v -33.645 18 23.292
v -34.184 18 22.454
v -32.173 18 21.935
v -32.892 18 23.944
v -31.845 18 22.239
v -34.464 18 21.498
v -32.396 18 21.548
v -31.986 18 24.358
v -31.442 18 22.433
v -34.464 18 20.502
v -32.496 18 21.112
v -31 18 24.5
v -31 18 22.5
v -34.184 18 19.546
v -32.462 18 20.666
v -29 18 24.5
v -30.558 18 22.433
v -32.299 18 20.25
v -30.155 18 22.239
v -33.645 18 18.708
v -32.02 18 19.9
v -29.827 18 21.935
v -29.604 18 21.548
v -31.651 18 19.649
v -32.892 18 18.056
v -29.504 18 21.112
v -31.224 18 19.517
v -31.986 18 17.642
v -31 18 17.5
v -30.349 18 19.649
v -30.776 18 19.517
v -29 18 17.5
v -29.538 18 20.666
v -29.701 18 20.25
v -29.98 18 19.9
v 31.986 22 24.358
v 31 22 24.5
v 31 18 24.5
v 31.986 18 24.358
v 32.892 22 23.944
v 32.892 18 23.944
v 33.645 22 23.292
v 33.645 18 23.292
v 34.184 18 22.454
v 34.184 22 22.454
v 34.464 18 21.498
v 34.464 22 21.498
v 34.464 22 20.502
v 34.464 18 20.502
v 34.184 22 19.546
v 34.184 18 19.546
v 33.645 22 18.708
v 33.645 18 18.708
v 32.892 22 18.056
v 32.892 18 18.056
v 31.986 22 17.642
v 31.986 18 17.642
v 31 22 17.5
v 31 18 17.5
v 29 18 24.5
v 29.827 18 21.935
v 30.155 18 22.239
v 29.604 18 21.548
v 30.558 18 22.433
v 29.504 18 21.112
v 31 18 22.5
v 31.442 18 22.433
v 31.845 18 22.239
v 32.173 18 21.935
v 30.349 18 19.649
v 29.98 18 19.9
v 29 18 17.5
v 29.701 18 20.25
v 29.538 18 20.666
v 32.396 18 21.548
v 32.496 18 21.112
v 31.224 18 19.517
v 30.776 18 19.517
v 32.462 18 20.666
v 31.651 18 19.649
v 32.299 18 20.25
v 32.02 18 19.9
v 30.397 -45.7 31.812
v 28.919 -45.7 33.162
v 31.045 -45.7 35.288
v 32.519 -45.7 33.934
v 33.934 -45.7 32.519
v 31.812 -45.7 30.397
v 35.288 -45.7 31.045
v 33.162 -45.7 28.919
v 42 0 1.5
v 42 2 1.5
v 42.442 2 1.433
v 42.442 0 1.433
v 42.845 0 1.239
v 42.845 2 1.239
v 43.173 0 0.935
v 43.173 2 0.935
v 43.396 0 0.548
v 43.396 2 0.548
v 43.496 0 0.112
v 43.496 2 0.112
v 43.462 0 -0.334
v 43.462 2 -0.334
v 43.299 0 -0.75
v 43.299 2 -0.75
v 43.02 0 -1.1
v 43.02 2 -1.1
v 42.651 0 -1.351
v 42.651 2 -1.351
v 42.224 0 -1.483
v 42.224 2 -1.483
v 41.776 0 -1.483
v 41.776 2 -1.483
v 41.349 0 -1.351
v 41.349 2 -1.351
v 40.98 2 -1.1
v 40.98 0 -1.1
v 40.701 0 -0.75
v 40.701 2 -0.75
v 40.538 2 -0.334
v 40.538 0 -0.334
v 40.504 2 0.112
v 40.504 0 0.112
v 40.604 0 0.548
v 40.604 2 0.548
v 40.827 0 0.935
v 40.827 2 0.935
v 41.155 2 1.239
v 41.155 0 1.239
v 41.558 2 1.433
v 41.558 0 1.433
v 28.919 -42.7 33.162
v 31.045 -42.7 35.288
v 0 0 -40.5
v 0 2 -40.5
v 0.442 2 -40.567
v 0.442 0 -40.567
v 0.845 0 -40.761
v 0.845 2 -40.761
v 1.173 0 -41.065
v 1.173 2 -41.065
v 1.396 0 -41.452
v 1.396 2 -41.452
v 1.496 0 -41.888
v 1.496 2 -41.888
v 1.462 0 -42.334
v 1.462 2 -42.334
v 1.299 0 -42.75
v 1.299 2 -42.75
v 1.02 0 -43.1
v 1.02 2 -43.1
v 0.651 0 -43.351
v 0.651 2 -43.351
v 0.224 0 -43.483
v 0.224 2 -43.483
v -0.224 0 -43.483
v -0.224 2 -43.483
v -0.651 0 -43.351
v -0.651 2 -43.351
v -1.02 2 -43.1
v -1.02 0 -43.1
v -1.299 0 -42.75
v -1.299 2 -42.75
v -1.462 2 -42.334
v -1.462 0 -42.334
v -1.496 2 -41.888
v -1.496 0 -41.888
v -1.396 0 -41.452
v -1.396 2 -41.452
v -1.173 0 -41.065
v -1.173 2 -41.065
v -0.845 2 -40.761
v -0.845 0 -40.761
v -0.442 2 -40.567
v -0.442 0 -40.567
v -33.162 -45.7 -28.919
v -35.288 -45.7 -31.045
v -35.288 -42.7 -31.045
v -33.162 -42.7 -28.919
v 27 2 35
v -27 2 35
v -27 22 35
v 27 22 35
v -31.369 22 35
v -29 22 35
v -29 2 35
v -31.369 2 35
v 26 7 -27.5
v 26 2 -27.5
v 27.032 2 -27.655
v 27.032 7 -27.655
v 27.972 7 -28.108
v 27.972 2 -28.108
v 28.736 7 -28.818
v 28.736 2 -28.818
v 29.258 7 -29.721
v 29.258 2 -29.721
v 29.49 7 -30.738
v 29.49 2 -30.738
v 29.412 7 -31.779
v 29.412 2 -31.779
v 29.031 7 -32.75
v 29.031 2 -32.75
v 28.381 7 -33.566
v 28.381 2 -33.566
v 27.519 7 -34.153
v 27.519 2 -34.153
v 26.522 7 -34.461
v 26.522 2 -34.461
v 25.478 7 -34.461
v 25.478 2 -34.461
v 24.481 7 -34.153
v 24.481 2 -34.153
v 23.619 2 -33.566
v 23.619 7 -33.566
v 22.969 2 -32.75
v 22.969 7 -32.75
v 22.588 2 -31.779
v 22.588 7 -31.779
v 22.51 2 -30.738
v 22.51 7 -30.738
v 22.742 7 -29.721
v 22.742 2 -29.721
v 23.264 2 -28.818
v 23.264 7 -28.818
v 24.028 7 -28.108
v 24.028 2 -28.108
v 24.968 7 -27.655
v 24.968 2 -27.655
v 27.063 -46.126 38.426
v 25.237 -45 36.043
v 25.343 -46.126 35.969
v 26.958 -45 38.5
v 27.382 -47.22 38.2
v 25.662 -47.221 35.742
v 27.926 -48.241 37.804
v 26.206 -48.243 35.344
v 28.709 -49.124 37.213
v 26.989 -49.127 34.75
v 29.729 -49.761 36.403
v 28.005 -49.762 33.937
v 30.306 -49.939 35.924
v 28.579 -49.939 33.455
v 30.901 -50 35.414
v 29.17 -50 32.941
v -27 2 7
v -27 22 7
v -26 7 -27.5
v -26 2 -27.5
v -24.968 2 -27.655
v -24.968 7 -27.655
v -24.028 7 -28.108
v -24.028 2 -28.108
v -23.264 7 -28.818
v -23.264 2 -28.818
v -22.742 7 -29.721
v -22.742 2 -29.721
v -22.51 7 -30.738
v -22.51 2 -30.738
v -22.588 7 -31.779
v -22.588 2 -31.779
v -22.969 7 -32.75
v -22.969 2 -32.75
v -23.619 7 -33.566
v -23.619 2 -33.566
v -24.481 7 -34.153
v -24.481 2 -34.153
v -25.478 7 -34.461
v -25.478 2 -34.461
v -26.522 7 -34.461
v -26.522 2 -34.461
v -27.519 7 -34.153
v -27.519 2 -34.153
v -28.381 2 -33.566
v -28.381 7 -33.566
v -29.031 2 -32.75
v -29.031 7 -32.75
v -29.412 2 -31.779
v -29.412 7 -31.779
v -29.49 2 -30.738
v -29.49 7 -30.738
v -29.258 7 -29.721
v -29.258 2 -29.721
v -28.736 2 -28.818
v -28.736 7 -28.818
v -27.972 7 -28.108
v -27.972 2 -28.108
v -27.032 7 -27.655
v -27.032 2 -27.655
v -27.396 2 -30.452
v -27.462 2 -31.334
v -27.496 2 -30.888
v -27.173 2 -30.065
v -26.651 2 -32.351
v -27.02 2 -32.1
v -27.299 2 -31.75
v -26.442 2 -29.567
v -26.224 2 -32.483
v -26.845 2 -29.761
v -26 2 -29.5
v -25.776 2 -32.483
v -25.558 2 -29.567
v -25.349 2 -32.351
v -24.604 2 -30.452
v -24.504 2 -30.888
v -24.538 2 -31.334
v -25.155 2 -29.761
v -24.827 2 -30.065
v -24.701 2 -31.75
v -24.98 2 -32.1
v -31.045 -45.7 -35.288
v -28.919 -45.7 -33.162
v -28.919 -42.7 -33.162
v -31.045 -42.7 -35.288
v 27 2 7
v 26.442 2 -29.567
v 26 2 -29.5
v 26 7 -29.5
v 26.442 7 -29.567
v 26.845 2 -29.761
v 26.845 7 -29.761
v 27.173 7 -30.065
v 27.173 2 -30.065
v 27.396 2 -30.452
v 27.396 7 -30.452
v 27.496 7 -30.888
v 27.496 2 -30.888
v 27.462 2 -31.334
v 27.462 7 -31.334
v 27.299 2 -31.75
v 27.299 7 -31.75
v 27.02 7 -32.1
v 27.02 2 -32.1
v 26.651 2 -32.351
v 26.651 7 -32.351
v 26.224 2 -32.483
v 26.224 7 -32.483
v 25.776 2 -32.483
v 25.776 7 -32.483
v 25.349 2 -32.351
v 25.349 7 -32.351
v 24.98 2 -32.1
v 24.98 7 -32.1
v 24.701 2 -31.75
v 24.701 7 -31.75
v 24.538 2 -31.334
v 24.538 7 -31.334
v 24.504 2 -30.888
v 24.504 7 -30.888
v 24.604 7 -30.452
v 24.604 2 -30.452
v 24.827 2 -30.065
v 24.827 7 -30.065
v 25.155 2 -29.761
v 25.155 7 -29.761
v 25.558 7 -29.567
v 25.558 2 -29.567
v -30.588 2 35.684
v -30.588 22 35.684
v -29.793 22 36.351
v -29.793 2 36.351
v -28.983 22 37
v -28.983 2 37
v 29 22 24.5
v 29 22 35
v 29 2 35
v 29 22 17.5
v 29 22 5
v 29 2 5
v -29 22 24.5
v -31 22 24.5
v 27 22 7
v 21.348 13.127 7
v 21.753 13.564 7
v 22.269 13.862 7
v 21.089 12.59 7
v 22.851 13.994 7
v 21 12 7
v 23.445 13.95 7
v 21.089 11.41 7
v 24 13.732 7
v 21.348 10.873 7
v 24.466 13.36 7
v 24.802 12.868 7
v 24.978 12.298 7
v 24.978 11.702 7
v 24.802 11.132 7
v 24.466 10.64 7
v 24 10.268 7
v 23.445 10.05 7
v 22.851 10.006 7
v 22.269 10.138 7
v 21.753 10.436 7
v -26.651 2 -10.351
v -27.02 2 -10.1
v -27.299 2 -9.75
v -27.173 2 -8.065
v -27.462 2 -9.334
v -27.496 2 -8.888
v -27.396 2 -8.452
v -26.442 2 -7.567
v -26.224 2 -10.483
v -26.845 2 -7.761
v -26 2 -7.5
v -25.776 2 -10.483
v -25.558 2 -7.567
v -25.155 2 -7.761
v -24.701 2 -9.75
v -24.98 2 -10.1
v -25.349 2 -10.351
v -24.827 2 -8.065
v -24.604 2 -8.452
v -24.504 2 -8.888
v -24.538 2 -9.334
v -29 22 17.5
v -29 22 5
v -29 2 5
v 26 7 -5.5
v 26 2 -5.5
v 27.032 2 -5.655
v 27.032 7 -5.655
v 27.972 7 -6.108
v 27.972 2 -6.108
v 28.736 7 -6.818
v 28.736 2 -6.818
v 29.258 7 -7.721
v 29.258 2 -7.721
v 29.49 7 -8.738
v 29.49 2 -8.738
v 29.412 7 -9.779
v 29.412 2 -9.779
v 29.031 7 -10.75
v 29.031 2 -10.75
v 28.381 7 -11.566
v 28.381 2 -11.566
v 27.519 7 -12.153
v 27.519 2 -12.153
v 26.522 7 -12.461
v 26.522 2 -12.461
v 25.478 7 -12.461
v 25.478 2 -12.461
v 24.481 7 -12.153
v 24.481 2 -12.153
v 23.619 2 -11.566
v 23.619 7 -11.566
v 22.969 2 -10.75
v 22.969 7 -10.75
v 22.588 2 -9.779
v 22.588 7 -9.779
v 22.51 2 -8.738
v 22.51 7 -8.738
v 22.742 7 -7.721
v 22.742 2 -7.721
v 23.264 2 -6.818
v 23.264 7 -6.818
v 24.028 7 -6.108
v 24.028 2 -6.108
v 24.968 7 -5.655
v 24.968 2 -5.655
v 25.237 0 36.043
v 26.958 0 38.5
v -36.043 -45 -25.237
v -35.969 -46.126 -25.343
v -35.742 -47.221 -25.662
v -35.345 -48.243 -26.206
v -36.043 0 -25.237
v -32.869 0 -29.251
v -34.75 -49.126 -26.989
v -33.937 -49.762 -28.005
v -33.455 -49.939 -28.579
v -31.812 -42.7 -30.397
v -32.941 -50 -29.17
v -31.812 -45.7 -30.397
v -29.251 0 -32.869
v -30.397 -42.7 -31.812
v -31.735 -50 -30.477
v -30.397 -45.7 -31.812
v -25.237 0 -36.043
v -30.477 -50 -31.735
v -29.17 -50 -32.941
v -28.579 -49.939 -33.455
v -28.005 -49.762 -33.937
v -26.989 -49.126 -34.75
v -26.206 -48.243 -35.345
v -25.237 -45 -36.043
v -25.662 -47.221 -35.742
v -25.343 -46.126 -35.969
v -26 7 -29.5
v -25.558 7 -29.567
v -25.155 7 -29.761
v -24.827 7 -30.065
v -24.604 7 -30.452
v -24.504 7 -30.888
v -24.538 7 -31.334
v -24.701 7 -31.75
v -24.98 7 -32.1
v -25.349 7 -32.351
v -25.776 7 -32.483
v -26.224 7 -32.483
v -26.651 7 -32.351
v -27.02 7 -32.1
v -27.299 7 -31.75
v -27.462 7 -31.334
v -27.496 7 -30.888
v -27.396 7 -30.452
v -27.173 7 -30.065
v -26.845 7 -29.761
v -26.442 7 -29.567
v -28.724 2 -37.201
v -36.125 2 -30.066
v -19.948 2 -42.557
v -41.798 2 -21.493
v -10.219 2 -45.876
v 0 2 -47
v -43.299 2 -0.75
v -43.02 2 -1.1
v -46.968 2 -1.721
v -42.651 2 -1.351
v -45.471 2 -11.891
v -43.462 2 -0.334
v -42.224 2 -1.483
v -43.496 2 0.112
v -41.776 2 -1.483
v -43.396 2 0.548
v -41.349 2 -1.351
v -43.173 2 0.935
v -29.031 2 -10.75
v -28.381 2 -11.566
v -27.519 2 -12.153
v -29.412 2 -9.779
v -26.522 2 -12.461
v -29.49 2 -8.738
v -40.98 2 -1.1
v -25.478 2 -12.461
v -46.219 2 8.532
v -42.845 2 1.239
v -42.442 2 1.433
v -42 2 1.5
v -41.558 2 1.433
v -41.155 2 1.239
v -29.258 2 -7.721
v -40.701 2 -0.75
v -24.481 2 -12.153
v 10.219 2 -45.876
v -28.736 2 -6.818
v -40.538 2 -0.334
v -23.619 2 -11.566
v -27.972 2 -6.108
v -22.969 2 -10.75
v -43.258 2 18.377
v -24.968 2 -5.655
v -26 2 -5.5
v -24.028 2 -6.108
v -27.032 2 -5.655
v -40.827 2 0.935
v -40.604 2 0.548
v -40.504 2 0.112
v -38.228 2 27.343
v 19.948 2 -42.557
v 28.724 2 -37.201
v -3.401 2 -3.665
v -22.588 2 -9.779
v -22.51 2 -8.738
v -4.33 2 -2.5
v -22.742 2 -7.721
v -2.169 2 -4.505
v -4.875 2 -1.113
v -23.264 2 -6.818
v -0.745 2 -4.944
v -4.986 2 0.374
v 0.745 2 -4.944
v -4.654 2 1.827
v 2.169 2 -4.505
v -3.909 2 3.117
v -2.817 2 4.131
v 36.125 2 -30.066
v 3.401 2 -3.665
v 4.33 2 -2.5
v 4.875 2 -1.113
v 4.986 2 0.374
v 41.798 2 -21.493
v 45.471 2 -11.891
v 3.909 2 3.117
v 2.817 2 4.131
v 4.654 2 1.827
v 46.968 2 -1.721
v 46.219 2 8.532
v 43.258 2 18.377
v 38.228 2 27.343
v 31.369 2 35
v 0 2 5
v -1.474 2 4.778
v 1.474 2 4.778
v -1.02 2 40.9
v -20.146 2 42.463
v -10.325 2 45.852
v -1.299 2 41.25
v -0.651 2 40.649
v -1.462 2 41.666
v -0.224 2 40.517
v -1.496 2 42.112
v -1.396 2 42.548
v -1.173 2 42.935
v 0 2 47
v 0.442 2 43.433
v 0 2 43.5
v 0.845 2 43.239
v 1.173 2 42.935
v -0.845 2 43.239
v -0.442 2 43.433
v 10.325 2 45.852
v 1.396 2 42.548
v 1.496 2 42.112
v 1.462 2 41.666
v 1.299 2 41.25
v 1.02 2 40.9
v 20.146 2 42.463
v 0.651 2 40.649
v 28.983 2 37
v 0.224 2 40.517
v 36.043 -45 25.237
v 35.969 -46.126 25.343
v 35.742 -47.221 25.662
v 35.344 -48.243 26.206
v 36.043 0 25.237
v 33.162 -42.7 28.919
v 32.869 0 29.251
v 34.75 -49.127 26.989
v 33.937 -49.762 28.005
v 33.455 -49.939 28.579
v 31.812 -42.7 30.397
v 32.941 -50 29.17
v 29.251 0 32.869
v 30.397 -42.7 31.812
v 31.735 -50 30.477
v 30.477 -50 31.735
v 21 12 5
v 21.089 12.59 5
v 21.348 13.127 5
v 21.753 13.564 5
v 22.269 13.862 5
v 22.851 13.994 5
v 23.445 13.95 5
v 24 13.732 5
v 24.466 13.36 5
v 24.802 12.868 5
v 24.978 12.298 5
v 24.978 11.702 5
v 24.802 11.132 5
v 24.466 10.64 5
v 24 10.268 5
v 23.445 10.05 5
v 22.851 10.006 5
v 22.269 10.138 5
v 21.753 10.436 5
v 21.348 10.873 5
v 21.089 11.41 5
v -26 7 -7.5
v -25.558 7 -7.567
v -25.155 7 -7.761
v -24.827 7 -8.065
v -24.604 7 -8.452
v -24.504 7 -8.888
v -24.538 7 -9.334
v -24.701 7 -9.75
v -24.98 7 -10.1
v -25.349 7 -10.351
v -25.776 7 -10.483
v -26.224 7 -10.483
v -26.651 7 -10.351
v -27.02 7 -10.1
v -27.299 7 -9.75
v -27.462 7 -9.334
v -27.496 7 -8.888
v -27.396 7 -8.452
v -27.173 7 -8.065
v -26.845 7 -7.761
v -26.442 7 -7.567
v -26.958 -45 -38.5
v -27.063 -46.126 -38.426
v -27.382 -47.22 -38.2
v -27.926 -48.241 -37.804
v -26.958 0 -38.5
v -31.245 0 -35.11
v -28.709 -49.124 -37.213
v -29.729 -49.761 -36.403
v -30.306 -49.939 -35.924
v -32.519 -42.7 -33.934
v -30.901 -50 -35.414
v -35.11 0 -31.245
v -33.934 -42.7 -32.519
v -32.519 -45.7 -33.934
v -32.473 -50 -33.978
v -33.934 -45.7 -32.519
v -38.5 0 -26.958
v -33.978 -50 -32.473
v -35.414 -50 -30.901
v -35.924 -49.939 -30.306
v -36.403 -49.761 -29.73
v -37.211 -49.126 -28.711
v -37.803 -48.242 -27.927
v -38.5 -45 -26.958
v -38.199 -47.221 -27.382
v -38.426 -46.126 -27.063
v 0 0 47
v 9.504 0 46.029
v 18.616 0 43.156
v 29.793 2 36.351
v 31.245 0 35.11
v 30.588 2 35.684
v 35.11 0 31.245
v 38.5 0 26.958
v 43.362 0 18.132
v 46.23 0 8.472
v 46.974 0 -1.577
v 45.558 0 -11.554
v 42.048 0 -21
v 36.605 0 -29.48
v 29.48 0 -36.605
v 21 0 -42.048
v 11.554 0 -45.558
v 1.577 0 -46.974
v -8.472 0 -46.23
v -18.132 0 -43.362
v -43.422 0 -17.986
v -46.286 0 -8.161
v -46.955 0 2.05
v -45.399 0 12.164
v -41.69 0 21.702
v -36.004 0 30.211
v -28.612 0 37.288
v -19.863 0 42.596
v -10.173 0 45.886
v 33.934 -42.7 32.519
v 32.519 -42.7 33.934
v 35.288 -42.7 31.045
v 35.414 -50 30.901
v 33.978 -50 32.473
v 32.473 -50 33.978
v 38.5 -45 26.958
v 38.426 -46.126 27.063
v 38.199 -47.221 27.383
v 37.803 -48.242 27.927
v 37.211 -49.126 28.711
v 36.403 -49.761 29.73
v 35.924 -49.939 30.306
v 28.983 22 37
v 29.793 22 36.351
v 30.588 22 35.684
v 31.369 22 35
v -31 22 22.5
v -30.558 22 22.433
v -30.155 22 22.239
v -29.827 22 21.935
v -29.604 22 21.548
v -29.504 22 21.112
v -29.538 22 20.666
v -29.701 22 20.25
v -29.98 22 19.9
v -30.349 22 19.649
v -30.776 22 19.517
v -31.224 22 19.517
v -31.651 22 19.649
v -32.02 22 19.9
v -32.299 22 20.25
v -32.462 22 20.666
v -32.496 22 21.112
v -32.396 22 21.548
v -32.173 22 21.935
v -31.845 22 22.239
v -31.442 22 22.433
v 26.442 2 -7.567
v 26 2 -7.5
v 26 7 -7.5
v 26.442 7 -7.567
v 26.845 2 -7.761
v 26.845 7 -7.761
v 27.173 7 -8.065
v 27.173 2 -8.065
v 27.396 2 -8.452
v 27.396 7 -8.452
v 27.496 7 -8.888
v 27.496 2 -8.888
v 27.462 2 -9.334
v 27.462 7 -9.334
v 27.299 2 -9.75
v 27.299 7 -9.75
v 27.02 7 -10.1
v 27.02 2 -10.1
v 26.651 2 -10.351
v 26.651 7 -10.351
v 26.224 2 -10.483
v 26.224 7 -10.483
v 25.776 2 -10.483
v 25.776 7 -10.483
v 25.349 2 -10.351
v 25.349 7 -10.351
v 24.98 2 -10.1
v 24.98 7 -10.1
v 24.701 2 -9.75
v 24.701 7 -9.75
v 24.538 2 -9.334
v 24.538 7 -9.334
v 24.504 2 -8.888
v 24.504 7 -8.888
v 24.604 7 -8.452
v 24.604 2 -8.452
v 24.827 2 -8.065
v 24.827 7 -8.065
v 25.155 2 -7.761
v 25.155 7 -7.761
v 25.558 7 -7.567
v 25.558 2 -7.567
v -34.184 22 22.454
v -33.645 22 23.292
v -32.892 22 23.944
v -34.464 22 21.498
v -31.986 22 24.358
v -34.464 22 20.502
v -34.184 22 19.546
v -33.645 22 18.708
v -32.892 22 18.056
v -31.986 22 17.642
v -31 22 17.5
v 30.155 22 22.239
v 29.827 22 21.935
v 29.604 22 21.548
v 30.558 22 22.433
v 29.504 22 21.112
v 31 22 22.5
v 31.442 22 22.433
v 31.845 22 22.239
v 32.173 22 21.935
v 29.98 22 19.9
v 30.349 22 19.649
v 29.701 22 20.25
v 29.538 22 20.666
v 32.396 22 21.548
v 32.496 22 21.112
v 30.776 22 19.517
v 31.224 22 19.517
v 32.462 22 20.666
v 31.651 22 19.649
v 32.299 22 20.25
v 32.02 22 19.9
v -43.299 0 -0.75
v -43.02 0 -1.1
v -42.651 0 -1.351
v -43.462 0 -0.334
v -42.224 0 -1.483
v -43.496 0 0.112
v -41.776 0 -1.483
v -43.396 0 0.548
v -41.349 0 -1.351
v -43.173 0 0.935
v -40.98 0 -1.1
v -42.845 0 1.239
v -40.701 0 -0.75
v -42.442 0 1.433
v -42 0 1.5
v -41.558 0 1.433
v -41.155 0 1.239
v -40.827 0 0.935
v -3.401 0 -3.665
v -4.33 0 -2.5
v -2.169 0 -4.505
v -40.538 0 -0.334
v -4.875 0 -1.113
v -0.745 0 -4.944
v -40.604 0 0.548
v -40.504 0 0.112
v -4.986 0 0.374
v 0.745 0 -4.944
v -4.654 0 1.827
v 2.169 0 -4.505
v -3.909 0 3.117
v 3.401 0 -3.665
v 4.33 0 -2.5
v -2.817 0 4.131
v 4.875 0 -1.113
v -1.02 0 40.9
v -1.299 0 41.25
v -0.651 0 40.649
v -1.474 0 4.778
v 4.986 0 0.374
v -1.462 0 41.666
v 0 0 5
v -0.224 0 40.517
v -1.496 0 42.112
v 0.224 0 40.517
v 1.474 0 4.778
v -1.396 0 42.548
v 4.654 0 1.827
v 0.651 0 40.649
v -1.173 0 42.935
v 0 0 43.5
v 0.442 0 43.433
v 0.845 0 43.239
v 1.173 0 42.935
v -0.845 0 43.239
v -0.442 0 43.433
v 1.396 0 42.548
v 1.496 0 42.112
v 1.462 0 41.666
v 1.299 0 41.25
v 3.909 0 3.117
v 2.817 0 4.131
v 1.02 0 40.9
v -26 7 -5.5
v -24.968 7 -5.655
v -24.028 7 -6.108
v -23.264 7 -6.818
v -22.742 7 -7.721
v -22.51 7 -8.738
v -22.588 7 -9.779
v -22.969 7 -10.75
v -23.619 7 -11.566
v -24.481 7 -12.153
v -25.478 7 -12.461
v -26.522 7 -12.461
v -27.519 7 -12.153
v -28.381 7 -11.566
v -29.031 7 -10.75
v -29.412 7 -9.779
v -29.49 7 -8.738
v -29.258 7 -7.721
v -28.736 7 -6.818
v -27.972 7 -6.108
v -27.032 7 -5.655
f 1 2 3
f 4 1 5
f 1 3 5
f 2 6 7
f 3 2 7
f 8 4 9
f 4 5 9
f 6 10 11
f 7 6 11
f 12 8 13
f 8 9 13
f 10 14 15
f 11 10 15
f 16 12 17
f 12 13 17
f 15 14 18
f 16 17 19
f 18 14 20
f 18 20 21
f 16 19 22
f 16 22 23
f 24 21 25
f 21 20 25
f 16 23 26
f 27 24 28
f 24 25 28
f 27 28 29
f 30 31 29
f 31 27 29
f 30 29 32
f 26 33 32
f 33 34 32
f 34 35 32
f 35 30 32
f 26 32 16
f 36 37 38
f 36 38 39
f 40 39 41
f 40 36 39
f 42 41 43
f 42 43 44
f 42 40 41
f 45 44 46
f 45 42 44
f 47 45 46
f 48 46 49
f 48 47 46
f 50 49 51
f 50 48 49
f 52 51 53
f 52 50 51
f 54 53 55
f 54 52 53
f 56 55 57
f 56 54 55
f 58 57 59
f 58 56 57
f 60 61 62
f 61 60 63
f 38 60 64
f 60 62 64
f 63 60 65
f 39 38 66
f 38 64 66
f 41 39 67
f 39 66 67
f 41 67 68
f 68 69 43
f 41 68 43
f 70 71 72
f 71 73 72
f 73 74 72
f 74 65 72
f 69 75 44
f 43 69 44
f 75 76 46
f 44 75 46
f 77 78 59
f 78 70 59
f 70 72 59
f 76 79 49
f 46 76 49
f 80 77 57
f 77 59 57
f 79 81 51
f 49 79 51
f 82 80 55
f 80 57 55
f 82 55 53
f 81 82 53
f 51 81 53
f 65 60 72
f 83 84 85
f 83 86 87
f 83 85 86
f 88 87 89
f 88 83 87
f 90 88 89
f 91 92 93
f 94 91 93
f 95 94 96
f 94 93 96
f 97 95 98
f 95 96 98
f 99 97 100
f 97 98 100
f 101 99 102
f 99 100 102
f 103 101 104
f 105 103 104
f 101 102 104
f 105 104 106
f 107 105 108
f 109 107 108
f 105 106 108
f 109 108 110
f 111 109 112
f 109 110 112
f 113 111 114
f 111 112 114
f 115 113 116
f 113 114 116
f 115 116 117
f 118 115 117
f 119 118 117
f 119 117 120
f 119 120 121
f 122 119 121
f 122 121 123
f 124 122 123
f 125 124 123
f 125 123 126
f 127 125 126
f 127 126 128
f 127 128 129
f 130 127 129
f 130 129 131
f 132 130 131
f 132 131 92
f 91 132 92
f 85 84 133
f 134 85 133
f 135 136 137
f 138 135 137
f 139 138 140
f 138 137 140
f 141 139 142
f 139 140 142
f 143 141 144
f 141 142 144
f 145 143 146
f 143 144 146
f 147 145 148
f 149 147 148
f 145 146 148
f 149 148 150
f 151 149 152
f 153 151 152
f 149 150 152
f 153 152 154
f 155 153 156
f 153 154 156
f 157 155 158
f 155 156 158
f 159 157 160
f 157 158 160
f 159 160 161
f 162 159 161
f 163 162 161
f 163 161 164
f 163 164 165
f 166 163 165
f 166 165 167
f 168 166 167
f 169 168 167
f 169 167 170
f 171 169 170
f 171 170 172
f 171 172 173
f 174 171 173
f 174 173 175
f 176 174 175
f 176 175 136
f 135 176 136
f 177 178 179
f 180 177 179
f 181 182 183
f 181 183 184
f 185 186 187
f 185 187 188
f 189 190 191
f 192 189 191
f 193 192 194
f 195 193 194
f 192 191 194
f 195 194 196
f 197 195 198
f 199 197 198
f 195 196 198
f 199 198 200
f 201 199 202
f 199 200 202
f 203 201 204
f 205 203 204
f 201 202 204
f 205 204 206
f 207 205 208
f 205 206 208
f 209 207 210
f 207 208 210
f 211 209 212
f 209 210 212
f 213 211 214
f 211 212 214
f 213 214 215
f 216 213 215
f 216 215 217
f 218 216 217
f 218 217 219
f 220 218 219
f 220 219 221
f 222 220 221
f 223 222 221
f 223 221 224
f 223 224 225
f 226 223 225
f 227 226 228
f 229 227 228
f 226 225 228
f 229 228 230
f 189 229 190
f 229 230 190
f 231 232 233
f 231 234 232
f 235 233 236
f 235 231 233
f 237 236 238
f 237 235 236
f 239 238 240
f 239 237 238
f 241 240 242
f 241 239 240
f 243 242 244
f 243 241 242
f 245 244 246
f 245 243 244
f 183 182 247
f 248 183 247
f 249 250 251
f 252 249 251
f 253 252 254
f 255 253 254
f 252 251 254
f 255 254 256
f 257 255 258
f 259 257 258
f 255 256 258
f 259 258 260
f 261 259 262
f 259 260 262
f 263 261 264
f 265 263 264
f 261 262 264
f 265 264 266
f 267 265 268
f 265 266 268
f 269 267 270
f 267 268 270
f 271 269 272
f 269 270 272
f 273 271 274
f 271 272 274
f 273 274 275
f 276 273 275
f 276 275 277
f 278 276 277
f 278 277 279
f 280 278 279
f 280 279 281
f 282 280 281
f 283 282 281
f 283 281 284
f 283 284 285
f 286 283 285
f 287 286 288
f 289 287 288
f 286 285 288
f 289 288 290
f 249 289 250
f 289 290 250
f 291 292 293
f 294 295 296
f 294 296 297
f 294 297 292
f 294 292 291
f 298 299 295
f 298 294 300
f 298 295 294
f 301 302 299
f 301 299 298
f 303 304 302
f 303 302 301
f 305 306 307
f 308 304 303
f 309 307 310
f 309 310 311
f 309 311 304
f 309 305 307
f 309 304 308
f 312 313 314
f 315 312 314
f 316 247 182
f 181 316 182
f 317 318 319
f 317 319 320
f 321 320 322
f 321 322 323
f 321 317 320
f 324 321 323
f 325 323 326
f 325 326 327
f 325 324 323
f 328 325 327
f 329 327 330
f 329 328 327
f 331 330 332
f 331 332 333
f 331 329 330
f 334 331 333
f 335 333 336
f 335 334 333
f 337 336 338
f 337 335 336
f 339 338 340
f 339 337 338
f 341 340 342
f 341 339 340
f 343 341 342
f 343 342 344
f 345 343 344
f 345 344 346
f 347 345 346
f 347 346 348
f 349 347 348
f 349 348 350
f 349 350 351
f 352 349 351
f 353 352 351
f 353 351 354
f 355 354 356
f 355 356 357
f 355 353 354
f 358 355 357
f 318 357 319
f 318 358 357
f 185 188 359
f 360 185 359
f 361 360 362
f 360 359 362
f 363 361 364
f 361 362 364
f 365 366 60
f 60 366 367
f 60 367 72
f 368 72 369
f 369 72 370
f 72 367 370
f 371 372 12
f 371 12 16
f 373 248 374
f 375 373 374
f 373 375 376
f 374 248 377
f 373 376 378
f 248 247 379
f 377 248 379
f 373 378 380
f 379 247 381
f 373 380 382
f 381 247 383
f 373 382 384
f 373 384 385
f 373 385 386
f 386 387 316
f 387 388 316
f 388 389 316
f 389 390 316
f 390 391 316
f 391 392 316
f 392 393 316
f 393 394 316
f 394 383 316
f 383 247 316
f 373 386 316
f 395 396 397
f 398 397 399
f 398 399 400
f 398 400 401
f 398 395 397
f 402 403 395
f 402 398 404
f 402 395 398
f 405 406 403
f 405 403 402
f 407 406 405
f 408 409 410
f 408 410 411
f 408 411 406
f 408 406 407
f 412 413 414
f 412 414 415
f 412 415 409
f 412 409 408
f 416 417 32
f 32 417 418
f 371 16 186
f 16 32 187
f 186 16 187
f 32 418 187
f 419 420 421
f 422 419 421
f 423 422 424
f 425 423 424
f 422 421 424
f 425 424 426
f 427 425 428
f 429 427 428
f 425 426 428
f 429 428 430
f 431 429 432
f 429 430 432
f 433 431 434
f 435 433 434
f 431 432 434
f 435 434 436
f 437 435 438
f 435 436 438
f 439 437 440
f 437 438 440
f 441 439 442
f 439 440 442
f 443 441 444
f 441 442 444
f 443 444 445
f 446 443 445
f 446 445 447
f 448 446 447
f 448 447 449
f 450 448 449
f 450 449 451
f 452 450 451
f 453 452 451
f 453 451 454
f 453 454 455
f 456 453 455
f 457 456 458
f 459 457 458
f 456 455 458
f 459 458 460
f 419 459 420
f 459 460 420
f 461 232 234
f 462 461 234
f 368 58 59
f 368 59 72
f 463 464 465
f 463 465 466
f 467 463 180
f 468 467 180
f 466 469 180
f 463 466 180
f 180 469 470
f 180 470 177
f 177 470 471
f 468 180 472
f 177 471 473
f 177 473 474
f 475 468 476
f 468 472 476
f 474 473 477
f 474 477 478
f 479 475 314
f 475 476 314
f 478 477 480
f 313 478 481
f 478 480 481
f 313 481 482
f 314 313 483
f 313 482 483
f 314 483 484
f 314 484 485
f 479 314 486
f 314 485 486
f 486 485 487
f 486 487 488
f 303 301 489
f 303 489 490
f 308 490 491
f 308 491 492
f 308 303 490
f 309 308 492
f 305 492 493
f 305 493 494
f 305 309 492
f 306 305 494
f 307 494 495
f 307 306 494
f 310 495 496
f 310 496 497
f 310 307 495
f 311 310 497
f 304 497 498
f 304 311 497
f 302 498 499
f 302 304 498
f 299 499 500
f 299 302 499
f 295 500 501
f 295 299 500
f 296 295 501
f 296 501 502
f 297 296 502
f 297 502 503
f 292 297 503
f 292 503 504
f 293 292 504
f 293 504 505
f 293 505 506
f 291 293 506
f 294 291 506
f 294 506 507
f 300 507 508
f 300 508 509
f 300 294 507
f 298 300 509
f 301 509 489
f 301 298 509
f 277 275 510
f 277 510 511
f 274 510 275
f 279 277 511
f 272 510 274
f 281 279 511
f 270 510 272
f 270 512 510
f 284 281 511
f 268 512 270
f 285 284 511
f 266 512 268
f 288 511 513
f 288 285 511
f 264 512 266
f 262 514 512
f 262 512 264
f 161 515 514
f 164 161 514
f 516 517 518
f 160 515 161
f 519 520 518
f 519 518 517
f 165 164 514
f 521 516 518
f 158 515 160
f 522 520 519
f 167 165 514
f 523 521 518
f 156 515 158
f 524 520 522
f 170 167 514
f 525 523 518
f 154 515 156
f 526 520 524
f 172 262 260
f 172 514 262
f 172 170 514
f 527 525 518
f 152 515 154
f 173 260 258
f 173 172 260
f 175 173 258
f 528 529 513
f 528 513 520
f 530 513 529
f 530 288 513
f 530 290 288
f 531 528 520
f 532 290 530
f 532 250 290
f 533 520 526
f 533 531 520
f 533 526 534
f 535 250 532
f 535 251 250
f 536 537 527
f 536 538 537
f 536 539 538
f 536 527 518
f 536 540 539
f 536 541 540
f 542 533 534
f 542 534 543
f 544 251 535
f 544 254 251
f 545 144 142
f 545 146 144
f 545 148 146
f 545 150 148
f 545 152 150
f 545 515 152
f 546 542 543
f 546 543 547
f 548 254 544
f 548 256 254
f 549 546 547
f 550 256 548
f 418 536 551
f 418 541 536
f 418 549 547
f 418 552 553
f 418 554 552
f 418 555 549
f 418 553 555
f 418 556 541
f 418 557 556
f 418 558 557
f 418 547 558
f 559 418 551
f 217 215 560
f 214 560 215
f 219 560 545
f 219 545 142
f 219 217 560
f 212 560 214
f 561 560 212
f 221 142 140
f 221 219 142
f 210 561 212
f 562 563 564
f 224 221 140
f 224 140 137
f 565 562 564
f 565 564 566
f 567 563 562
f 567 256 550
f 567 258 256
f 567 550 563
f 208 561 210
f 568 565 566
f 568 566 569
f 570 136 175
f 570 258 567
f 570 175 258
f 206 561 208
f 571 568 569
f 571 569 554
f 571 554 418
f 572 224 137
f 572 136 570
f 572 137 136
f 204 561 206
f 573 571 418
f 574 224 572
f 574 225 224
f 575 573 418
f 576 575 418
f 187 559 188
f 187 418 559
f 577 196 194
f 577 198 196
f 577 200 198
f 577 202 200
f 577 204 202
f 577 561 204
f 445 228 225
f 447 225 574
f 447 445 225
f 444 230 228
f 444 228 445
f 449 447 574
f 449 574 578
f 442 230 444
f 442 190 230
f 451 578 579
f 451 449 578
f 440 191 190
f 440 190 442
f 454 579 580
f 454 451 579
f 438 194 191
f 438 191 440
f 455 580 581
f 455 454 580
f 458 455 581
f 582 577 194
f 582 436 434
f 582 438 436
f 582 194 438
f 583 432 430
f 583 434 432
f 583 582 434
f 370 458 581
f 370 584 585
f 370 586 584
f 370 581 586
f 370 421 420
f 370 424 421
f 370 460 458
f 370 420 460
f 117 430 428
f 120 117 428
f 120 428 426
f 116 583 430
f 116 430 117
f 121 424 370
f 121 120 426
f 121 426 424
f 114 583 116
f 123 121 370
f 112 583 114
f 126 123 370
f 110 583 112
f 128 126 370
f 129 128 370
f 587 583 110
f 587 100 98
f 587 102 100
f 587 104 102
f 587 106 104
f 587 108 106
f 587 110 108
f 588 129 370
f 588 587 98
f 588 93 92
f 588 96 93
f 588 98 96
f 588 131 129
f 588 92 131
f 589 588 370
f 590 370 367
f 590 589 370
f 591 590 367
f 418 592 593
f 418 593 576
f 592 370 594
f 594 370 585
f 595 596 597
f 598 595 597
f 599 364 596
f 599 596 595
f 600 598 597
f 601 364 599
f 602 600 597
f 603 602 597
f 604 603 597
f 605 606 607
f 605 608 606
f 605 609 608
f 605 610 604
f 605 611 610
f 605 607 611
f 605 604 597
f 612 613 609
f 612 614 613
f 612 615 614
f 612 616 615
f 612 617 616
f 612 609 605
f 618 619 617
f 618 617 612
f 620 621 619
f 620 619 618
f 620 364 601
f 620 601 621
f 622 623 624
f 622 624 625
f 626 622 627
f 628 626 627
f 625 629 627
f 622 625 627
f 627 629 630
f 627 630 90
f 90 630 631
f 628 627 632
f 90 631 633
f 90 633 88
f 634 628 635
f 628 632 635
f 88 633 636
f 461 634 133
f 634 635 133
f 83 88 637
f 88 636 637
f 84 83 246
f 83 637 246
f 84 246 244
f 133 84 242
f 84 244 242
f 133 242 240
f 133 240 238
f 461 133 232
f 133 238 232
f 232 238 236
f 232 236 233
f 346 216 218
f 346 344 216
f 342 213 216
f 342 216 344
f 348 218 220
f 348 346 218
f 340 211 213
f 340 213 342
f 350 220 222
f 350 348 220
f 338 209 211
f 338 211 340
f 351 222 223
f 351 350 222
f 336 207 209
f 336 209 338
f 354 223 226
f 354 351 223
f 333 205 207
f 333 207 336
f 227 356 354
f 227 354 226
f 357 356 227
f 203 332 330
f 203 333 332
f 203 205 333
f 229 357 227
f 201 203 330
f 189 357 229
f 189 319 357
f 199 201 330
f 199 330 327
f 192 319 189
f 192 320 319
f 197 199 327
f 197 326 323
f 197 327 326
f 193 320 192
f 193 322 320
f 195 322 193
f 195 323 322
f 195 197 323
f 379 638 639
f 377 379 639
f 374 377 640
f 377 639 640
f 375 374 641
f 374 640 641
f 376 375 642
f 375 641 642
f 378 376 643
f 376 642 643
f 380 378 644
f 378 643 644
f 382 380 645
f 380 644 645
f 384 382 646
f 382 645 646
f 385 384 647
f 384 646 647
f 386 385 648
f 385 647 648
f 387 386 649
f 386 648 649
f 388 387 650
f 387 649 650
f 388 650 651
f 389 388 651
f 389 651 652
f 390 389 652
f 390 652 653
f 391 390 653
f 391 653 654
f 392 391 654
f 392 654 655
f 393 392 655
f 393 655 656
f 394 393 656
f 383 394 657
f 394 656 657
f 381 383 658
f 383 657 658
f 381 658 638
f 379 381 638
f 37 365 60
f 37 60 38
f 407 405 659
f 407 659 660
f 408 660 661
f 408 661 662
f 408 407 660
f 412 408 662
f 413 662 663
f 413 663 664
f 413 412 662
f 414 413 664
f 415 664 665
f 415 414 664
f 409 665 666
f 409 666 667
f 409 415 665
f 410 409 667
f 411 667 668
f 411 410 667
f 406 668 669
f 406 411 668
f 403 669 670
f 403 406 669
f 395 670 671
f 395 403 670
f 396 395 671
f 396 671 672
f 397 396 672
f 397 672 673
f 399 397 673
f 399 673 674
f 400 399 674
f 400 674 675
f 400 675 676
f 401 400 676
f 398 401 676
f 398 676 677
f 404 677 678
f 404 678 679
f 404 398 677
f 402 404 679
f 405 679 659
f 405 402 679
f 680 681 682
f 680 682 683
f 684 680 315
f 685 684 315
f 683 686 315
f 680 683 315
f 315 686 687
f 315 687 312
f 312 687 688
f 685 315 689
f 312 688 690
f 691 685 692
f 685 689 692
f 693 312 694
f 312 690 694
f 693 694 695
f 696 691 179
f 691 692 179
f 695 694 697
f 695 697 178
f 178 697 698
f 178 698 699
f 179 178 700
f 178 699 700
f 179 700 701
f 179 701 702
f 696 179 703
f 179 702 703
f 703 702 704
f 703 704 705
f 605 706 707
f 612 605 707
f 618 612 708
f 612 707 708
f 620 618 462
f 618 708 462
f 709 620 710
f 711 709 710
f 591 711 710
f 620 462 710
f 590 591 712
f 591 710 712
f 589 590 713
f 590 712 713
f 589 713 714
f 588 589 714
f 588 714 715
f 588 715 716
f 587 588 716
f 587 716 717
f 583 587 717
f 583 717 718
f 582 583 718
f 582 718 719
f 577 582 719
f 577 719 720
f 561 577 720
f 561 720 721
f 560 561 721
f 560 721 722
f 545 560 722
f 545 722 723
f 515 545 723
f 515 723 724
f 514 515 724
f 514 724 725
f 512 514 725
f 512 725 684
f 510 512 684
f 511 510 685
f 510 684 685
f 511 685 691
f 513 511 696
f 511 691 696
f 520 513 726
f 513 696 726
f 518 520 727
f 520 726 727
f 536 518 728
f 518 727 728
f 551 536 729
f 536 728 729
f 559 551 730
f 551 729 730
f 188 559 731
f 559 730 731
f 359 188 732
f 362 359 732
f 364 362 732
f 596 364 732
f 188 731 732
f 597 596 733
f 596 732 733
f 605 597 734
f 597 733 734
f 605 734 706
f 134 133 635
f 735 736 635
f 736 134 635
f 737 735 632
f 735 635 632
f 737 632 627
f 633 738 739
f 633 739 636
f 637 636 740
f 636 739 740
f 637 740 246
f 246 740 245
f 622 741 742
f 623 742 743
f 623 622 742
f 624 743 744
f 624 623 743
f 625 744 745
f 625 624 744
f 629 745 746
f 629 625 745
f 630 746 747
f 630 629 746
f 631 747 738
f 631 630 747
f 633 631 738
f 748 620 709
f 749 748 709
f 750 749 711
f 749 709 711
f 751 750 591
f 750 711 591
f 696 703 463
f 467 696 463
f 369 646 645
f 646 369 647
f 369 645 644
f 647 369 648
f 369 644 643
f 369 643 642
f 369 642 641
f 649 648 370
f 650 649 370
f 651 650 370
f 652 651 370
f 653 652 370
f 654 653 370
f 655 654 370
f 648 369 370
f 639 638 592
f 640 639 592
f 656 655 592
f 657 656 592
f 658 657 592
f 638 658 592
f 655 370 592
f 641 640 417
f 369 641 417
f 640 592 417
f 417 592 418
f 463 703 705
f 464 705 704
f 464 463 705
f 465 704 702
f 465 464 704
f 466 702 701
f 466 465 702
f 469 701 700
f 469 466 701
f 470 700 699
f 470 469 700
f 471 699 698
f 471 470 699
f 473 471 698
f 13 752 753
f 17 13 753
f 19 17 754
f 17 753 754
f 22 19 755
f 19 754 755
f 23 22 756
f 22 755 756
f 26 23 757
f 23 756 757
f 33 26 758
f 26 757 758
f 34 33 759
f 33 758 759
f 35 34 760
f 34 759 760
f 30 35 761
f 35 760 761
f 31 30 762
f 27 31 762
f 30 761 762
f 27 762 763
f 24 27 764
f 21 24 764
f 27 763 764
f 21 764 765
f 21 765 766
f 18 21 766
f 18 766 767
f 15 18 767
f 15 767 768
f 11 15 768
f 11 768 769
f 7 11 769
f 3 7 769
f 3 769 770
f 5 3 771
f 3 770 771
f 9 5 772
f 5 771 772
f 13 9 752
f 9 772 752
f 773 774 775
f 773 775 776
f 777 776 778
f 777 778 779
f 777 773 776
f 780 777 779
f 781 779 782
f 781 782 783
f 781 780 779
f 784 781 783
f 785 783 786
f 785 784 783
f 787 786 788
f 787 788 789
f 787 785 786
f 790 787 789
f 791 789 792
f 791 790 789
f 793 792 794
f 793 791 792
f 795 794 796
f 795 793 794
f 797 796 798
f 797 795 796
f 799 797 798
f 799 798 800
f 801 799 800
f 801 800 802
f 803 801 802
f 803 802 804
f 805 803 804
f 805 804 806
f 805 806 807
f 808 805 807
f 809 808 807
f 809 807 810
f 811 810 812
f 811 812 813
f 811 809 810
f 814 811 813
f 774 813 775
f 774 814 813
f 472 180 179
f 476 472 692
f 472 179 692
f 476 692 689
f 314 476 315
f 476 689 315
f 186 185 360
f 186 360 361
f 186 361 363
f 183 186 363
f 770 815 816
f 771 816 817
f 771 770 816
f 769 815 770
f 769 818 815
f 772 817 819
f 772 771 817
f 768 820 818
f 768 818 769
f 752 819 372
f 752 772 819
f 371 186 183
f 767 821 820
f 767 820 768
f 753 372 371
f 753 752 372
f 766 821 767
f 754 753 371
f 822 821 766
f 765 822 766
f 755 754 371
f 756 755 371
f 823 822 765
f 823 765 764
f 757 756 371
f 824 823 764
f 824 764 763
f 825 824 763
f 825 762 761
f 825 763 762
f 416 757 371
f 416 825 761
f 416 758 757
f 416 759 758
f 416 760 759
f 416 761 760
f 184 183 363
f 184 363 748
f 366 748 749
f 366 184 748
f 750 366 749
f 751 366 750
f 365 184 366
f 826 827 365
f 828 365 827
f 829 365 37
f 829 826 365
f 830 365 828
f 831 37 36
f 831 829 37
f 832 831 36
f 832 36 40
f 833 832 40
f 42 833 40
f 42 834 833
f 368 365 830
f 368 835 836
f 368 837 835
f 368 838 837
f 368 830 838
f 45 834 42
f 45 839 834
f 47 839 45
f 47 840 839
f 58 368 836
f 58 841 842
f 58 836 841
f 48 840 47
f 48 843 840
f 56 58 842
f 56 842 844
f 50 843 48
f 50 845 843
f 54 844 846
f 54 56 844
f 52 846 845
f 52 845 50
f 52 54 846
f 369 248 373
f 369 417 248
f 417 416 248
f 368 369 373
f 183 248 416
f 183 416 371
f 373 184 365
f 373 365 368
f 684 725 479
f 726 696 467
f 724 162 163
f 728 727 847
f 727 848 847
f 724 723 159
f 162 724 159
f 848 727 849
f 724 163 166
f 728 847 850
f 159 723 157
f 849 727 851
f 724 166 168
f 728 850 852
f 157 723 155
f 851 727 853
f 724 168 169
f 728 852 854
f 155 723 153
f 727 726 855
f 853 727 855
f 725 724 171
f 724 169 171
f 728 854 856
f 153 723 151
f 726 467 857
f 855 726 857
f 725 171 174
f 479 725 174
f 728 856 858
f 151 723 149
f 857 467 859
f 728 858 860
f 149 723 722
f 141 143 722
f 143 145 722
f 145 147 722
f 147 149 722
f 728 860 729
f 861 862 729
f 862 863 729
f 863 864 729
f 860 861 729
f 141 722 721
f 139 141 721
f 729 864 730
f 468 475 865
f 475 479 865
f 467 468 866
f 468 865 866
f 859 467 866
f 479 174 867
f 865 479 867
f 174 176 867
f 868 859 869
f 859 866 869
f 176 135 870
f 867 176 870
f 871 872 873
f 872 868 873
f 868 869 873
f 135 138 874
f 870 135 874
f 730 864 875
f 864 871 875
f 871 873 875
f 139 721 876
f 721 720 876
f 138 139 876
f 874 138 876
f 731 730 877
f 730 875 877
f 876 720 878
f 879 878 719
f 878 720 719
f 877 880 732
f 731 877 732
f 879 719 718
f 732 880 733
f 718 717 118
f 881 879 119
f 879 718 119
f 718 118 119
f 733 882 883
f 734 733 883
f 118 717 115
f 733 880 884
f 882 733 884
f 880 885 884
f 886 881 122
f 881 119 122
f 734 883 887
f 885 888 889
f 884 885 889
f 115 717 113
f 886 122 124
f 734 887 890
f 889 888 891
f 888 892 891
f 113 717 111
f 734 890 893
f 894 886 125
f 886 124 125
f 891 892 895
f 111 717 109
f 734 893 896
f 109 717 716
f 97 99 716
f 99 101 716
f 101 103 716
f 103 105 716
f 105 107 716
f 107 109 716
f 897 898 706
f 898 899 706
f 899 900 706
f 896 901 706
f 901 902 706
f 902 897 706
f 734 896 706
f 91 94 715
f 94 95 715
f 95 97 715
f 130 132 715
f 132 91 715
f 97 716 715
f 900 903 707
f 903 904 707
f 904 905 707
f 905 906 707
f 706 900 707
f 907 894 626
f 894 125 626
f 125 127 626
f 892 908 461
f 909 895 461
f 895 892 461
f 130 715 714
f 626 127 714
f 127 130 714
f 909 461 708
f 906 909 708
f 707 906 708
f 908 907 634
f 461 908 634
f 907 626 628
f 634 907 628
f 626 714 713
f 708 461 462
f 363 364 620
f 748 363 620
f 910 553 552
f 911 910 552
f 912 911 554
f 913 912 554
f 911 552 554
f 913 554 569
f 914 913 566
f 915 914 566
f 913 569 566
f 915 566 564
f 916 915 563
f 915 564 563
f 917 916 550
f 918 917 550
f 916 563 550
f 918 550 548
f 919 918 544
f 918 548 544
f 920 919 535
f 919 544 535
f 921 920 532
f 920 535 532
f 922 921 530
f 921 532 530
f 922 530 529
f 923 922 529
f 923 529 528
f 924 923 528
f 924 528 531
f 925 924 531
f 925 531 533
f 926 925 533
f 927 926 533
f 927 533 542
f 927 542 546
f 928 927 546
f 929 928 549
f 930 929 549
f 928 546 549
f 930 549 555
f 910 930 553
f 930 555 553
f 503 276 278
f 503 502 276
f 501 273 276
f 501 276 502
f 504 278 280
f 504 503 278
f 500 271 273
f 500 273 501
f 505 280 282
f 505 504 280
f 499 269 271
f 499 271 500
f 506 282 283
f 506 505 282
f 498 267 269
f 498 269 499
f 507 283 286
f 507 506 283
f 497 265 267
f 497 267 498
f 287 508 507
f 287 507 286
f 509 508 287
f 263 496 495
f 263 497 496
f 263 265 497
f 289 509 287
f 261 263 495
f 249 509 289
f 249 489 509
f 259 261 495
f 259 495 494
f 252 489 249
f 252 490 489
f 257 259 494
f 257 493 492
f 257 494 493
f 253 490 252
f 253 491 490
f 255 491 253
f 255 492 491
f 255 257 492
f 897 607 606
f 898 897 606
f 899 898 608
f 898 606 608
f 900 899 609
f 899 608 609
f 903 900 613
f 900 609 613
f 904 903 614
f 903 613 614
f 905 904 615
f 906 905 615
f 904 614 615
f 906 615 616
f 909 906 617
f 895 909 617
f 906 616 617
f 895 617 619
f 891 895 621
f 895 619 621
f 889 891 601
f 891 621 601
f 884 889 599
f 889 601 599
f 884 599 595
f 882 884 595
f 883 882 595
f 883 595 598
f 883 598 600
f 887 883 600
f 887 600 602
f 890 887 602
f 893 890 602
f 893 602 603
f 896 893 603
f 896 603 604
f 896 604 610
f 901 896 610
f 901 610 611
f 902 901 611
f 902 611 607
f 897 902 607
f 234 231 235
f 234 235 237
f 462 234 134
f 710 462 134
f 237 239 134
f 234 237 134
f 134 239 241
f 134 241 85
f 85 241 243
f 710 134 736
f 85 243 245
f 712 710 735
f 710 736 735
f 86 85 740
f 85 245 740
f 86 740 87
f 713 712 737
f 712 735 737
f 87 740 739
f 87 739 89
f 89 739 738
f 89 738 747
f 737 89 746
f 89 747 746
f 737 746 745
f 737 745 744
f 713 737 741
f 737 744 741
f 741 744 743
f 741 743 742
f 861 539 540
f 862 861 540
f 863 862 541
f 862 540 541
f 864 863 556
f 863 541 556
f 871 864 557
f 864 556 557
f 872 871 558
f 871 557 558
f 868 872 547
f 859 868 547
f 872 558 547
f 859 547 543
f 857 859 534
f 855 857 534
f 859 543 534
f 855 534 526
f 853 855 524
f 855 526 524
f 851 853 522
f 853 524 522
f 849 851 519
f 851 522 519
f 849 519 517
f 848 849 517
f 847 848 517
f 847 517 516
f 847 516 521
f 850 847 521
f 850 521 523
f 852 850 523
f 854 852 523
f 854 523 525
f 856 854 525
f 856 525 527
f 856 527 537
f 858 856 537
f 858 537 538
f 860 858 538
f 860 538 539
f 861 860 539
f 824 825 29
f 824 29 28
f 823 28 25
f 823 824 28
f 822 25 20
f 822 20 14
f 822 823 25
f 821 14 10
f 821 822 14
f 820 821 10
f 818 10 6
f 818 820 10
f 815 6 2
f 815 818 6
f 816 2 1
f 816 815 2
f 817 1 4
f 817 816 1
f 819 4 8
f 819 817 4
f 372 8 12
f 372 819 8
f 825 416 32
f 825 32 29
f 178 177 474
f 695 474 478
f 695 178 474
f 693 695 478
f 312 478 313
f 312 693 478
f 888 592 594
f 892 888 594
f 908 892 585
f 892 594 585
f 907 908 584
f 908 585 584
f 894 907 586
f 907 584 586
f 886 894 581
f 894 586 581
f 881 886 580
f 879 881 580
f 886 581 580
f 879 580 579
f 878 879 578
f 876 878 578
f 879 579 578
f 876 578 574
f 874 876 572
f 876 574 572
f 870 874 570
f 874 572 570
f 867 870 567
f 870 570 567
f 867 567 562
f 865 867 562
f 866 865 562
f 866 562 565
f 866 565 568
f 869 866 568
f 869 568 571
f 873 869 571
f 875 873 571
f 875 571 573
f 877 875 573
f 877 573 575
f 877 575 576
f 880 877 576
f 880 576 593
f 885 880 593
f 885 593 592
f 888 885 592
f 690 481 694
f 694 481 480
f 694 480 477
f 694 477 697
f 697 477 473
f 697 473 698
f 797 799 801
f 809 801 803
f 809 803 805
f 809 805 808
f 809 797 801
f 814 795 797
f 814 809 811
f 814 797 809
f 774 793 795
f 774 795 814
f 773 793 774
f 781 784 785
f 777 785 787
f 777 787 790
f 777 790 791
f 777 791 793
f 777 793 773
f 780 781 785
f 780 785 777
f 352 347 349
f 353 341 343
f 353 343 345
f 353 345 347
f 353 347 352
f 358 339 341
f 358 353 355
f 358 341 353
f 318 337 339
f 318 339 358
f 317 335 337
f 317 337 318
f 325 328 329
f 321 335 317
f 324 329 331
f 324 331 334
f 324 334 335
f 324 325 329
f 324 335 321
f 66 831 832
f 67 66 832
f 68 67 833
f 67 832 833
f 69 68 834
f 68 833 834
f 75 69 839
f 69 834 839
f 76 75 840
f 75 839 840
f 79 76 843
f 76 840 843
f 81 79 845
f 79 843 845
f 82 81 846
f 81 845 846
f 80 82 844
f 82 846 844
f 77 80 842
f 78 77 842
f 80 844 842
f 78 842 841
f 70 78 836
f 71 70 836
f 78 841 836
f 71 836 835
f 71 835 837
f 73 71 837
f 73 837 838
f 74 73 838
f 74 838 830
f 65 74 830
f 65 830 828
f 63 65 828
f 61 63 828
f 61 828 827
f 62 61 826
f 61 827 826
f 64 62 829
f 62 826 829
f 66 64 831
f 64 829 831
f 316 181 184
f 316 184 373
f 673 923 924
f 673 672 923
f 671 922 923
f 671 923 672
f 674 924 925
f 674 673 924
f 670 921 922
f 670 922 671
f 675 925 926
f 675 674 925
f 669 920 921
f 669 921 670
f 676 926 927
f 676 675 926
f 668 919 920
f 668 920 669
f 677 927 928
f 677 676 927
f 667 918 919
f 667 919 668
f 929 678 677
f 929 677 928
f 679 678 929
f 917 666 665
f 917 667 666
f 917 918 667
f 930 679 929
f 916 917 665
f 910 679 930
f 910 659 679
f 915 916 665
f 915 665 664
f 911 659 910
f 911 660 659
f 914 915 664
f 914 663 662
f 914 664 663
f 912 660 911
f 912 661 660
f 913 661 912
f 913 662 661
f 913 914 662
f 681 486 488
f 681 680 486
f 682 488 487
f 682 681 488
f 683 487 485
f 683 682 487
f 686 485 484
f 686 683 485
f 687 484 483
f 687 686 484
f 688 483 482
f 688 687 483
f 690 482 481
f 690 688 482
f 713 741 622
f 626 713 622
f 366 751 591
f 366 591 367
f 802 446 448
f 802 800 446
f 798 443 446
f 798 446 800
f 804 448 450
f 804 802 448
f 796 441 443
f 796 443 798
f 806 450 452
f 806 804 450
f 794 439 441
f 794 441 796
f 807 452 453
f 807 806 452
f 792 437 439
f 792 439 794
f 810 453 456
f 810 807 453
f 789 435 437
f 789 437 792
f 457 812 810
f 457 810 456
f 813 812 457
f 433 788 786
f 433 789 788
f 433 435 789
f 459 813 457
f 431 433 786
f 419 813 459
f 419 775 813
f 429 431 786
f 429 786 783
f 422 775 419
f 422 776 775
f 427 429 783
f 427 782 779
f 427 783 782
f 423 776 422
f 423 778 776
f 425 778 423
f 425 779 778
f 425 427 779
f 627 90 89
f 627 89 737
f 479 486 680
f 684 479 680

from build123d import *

# Parameters (mm, degrees)
CROQUIS1_R                 = 47
SALIENTE_EXTRUIR1_DEPTH    = 2
CROQUIS2_W                 = 54
CROQUIS2_H                 = 28
SALIENTE_EXTRUIR4_DEPTH    = 20
CROQUIS3_R                 = 3.5
CROQUIS3_R_2               = 1.5
SALIENTE_EXTRUIR5_DEPTH    = 5
CROQUIS4_R                 = 1.5
SALIENTE_EXTRUIR6_DEPTH    = 4
CROQUIS5_R                 = 1.5
CORTAR_EXTRUIR1_DEPTH      = 4
CROQUIS6_R                 = 5
CORTAR_EXTRUIR2_DEPTH      = 4
CROQUIS7_R                 = 2
CORTAR_EXTRUIR3_DEPTH      = 2
SALIENTE_EXTRUIR7_START    = 50
SALIENTE_EXTRUIR7_DEPTH    = 50
REDONDEO1_R                = 5
REDONDEO2_R                = 5
SALIENTE_EXTRUIR9_DEPTH    = 50
CORTAR_EXTRUIR6_DEPTH      = 128.666518168
CORTAR_EXTRUIR6_DEPTH_BACK = 128.666518168
CROQUIS12_W                = 6
CROQUIS12_H                = 3


# Read off the part's stored shape, not the designer's step: Cortar-Extruir7
with BuildPart() as part:
    # Croquis1 → Saliente-Extruir1 (new body)
    with BuildSketch(Plane(origin=(0, 0, 0), x_dir=(1, 0, 0), z_dir=(0, 1, 0))):
        with Locations(Location((0, 0, 0), (0, 0, 270))):
            Circle(CROQUIS1_R)
    extrude(amount=SALIENTE_EXTRUIR1_DEPTH)

    # Croquis2 → Saliente-Extruir4 (add)
    with BuildSketch(Plane(origin=(0, 2, 0), x_dir=(1, 0, 0), z_dir=(0, 1, 0))):
        with BuildLine():
            Line((29, -5), (-29, -5))
            Line((-29, -5), (-29, -35))
            Line((-29, -35), (-31.368774283, -35))
            ThreePointArc((-31.368774283, -35), (-30.19232893, -36.019762267), (-28.982753492, -37))
            Line((-28.982753492, -37), (28.982753492, -37))
            ThreePointArc((28.982753492, -37), (30.19232893, -36.019762267), (31.368774283, -35))
            Line((31.368774283, -35), (29, -35))
            Line((29, -35), (29, -5))
        make_face()
        with Locations((0, -21)):
            Rectangle(CROQUIS2_W, CROQUIS2_H, mode=Mode.SUBTRACT)
    extrude(amount=SALIENTE_EXTRUIR4_DEPTH)

    # Croquis3 → Saliente-Extruir5 (add)
    # profile 1 of 4: a face of its own
    with BuildSketch(Plane(origin=(0, 2, 0), x_dir=(1, 0, 0), z_dir=(0, 1, 0))):
        with Locations(Location((-26, 31, 0), (0, 0, 270))):
            Circle(CROQUIS3_R)
        with Locations(Location((-26, 31, 0), (0, 0, 270))):
            Circle(CROQUIS3_R_2, mode=Mode.SUBTRACT)
    # profile 2 of 4: a face of its own
    with BuildSketch(Plane(origin=(0, 2, 0), x_dir=(1, 0, 0), z_dir=(0, 1, 0))):
        with Locations(Location((-26, 9, 0), (0, 0, 270))):
            Circle(CROQUIS3_R)
        with Locations(Location((-26, 9, 0), (0, 0, 270))):
            Circle(CROQUIS3_R_2, mode=Mode.SUBTRACT)
    # profile 3 of 4: a face of its own
    with BuildSketch(Plane(origin=(0, 2, 0), x_dir=(1, 0, 0), z_dir=(0, 1, 0))):
        with Locations(Location((26, 9, 0), (0, 0, 270))):
            Circle(CROQUIS3_R)
        with Locations(Location((26, 9, 0), (0, 0, 270))):
            Circle(CROQUIS3_R_2, mode=Mode.SUBTRACT)
    # profile 4 of 4: a face of its own
    with BuildSketch(Plane(origin=(0, 2, 0), x_dir=(1, 0, 0), z_dir=(0, 1, 0))):
        with Locations(Location((26, 31, 0), (0, 0, 270))):
            Circle(CROQUIS3_R)
        with Locations(Location((26, 31, 0), (0, 0, 270))):
            Circle(CROQUIS3_R_2, mode=Mode.SUBTRACT)
    extrude(amount=SALIENTE_EXTRUIR5_DEPTH)

    # Croquis4 → Saliente-Extruir6 (add)
    # profile 1 of 2: a face of its own
    with BuildSketch(Plane(origin=(0, 22, 0), x_dir=(1, 0, 0), z_dir=(0, 1, 0))):
        with BuildLine():
            Line((-29, -17.5), (-31, -17.5))
            ThreePointArc((-31, -17.5), (-34.5, -21), (-31, -24.5))
            Line((-31, -24.5), (-29, -24.5))
            Line((-29, -24.5), (-29, -17.5))
        make_face()
        with Locations(Location((-31, -21, 0), (0, 0, 270))):
            Circle(CROQUIS4_R, mode=Mode.SUBTRACT)
    # profile 2 of 2: a face of its own
    with BuildSketch(Plane(origin=(0, 22, 0), x_dir=(1, 0, 0), z_dir=(0, 1, 0))):
        with BuildLine():
            ThreePointArc((31, -24.5), (34.5, -21), (31, -17.5))
            Line((31, -17.5), (29, -17.5))
            Line((29, -17.5), (29, -24.5))
            Line((29, -24.5), (31, -24.5))
        make_face()
        with Locations(Location((31, -21, 0), (0, 0, 270))):
            Circle(CROQUIS4_R, mode=Mode.SUBTRACT)
    extrude(amount=-SALIENTE_EXTRUIR6_DEPTH)

    # Croquis5 → Cortar-Extruir1 (cut)
    with BuildSketch(Plane(origin=(0, 2, 0), x_dir=(1, 0, 0), z_dir=(0, 1, 0))):
        with Locations(Location((0, 42, 0), (0, 0, 270))):
            Circle(CROQUIS5_R)
        with Locations(Location((0, -42, 0), (0, 0, 270))):
            Circle(CROQUIS5_R)
        with Locations(Location((42, 0, 0), (0, 0, 270))):
            Circle(CROQUIS5_R)
        with Locations(Location((-42, 0, 0), (0, 0, 270))):
            Circle(CROQUIS5_R)
    extrude(amount=-CORTAR_EXTRUIR1_DEPTH, mode=Mode.SUBTRACT)

    # Croquis6 → Cortar-Extruir2 (cut)
    with BuildSketch(Plane(origin=(0, 2, 0), x_dir=(1, 0, 0), z_dir=(0, 1, 0))):
        with Locations(Location((0, 0, 0), (0, 0, 270))):
            Circle(CROQUIS6_R)
    extrude(amount=-CORTAR_EXTRUIR2_DEPTH, mode=Mode.SUBTRACT)

    # Croquis7 → Cortar-Extruir3 (cut)
    with BuildSketch(Plane(origin=(0, 0, 5), x_dir=(-1, 0, 0), z_dir=(0, 0, -1))):
        with Locations((-23, 12)):
            Circle(CROQUIS7_R)
    extrude(amount=-CORTAR_EXTRUIR3_DEPTH, mode=Mode.SUBTRACT)

    # Croquis8 → Saliente-Extruir7 (add)
    with BuildSketch(Plane.XZ.offset(SALIENTE_EXTRUIR7_START)):
        with BuildLine():
            Line((-25.237363199, -36.042689949), (-26.958092508, -38.500146082))
            ThreePointArc((-26.958092508, -38.500146082), (-33.234018716, -33.234018716), (-38.500146082, -26.958092508))
            Line((-38.500146082, -26.958092508), (-36.042689949, -25.237363199))
            ThreePointArc((-36.042689949, -25.237363199), (-31.112698372, -31.112698372), (-25.237363199, -36.042689949))
        make_face()
        with BuildLine():
            Line((25.237363199, 36.042689949), (26.958092508, 38.500146082))
            ThreePointArc((26.958092508, 38.500146082), (33.234018716, 33.234018716), (38.500146082, 26.958092508))
            Line((38.500146082, 26.958092508), (36.042689949, 25.237363199))
            ThreePointArc((36.042689949, 25.237363199), (31.112698372, 31.112698372), (25.237363199, 36.042689949))
        make_face()
    extrude(amount=-SALIENTE_EXTRUIR7_DEPTH)

    # Redondeo1
    redondeo1_edges = [part.edges().sort_by_distance(p)[0] for p in [
        (37.271418015, -50, 26.097727854),
        (26.097727854, -50, 37.271418015),
    ]]
    fillet(redondeo1_edges, radius=REDONDEO1_R)

    # Redondeo2
    redondeo2_edges = [part.edges().sort_by_distance(p)[0] for p in [
        (-37.271418015, -50, -26.097727854),
        (-26.097727854, -50, -37.271418015),
    ]]
    fillet(redondeo2_edges, radius=REDONDEO2_R)


with BuildPart() as body_2:
    # Croquis9 → Saliente-Extruir9 (new body)
    with BuildSketch(Plane.XZ.offset(50)):
        Polygon((34.648232278, 34.648232278), (32.526911935, 36.769552622), (33.941125497, 38.183766184), (38.183766184, 33.941125497), (36.769552622, 32.526911935), align=None)
    extrude(amount=-SALIENTE_EXTRUIR9_DEPTH)


with BuildPart() as cortar_extruir6_tool:
    # Croquis12 → Cortar-Extruir6 (new, two sides: drawn at the far end of the back side and taken through both)
    with BuildSketch(Plane(origin=(36.062445841, 0, 36.062445841), x_dir=(0.7071067811865475, 0, -0.7071067811865477), z_dir=(0.7071067811865477, 0, 0.7071067811865475)).offset(-CORTAR_EXTRUIR6_DEPTH_BACK)):
        with Locations((0, -44.2)):
            Rectangle(CROQUIS12_W, CROQUIS12_H)
    extrude(amount=CORTAR_EXTRUIR6_DEPTH + CORTAR_EXTRUIR6_DEPTH_BACK)


with BuildPart() as part_1:
    add(part.part)

    # Cortar-Extruir6: cut by cortar_extruir6_tool
    add(cortar_extruir6_tool.part, mode=Mode.SUBTRACT)


with BuildPart() as body_2_1:
    add(body_2.part)

    # Cortar-Extruir6: cut by cortar_extruir6_tool
    add(cortar_extruir6_tool.part, mode=Mode.SUBTRACT)


solid = part_1.part
